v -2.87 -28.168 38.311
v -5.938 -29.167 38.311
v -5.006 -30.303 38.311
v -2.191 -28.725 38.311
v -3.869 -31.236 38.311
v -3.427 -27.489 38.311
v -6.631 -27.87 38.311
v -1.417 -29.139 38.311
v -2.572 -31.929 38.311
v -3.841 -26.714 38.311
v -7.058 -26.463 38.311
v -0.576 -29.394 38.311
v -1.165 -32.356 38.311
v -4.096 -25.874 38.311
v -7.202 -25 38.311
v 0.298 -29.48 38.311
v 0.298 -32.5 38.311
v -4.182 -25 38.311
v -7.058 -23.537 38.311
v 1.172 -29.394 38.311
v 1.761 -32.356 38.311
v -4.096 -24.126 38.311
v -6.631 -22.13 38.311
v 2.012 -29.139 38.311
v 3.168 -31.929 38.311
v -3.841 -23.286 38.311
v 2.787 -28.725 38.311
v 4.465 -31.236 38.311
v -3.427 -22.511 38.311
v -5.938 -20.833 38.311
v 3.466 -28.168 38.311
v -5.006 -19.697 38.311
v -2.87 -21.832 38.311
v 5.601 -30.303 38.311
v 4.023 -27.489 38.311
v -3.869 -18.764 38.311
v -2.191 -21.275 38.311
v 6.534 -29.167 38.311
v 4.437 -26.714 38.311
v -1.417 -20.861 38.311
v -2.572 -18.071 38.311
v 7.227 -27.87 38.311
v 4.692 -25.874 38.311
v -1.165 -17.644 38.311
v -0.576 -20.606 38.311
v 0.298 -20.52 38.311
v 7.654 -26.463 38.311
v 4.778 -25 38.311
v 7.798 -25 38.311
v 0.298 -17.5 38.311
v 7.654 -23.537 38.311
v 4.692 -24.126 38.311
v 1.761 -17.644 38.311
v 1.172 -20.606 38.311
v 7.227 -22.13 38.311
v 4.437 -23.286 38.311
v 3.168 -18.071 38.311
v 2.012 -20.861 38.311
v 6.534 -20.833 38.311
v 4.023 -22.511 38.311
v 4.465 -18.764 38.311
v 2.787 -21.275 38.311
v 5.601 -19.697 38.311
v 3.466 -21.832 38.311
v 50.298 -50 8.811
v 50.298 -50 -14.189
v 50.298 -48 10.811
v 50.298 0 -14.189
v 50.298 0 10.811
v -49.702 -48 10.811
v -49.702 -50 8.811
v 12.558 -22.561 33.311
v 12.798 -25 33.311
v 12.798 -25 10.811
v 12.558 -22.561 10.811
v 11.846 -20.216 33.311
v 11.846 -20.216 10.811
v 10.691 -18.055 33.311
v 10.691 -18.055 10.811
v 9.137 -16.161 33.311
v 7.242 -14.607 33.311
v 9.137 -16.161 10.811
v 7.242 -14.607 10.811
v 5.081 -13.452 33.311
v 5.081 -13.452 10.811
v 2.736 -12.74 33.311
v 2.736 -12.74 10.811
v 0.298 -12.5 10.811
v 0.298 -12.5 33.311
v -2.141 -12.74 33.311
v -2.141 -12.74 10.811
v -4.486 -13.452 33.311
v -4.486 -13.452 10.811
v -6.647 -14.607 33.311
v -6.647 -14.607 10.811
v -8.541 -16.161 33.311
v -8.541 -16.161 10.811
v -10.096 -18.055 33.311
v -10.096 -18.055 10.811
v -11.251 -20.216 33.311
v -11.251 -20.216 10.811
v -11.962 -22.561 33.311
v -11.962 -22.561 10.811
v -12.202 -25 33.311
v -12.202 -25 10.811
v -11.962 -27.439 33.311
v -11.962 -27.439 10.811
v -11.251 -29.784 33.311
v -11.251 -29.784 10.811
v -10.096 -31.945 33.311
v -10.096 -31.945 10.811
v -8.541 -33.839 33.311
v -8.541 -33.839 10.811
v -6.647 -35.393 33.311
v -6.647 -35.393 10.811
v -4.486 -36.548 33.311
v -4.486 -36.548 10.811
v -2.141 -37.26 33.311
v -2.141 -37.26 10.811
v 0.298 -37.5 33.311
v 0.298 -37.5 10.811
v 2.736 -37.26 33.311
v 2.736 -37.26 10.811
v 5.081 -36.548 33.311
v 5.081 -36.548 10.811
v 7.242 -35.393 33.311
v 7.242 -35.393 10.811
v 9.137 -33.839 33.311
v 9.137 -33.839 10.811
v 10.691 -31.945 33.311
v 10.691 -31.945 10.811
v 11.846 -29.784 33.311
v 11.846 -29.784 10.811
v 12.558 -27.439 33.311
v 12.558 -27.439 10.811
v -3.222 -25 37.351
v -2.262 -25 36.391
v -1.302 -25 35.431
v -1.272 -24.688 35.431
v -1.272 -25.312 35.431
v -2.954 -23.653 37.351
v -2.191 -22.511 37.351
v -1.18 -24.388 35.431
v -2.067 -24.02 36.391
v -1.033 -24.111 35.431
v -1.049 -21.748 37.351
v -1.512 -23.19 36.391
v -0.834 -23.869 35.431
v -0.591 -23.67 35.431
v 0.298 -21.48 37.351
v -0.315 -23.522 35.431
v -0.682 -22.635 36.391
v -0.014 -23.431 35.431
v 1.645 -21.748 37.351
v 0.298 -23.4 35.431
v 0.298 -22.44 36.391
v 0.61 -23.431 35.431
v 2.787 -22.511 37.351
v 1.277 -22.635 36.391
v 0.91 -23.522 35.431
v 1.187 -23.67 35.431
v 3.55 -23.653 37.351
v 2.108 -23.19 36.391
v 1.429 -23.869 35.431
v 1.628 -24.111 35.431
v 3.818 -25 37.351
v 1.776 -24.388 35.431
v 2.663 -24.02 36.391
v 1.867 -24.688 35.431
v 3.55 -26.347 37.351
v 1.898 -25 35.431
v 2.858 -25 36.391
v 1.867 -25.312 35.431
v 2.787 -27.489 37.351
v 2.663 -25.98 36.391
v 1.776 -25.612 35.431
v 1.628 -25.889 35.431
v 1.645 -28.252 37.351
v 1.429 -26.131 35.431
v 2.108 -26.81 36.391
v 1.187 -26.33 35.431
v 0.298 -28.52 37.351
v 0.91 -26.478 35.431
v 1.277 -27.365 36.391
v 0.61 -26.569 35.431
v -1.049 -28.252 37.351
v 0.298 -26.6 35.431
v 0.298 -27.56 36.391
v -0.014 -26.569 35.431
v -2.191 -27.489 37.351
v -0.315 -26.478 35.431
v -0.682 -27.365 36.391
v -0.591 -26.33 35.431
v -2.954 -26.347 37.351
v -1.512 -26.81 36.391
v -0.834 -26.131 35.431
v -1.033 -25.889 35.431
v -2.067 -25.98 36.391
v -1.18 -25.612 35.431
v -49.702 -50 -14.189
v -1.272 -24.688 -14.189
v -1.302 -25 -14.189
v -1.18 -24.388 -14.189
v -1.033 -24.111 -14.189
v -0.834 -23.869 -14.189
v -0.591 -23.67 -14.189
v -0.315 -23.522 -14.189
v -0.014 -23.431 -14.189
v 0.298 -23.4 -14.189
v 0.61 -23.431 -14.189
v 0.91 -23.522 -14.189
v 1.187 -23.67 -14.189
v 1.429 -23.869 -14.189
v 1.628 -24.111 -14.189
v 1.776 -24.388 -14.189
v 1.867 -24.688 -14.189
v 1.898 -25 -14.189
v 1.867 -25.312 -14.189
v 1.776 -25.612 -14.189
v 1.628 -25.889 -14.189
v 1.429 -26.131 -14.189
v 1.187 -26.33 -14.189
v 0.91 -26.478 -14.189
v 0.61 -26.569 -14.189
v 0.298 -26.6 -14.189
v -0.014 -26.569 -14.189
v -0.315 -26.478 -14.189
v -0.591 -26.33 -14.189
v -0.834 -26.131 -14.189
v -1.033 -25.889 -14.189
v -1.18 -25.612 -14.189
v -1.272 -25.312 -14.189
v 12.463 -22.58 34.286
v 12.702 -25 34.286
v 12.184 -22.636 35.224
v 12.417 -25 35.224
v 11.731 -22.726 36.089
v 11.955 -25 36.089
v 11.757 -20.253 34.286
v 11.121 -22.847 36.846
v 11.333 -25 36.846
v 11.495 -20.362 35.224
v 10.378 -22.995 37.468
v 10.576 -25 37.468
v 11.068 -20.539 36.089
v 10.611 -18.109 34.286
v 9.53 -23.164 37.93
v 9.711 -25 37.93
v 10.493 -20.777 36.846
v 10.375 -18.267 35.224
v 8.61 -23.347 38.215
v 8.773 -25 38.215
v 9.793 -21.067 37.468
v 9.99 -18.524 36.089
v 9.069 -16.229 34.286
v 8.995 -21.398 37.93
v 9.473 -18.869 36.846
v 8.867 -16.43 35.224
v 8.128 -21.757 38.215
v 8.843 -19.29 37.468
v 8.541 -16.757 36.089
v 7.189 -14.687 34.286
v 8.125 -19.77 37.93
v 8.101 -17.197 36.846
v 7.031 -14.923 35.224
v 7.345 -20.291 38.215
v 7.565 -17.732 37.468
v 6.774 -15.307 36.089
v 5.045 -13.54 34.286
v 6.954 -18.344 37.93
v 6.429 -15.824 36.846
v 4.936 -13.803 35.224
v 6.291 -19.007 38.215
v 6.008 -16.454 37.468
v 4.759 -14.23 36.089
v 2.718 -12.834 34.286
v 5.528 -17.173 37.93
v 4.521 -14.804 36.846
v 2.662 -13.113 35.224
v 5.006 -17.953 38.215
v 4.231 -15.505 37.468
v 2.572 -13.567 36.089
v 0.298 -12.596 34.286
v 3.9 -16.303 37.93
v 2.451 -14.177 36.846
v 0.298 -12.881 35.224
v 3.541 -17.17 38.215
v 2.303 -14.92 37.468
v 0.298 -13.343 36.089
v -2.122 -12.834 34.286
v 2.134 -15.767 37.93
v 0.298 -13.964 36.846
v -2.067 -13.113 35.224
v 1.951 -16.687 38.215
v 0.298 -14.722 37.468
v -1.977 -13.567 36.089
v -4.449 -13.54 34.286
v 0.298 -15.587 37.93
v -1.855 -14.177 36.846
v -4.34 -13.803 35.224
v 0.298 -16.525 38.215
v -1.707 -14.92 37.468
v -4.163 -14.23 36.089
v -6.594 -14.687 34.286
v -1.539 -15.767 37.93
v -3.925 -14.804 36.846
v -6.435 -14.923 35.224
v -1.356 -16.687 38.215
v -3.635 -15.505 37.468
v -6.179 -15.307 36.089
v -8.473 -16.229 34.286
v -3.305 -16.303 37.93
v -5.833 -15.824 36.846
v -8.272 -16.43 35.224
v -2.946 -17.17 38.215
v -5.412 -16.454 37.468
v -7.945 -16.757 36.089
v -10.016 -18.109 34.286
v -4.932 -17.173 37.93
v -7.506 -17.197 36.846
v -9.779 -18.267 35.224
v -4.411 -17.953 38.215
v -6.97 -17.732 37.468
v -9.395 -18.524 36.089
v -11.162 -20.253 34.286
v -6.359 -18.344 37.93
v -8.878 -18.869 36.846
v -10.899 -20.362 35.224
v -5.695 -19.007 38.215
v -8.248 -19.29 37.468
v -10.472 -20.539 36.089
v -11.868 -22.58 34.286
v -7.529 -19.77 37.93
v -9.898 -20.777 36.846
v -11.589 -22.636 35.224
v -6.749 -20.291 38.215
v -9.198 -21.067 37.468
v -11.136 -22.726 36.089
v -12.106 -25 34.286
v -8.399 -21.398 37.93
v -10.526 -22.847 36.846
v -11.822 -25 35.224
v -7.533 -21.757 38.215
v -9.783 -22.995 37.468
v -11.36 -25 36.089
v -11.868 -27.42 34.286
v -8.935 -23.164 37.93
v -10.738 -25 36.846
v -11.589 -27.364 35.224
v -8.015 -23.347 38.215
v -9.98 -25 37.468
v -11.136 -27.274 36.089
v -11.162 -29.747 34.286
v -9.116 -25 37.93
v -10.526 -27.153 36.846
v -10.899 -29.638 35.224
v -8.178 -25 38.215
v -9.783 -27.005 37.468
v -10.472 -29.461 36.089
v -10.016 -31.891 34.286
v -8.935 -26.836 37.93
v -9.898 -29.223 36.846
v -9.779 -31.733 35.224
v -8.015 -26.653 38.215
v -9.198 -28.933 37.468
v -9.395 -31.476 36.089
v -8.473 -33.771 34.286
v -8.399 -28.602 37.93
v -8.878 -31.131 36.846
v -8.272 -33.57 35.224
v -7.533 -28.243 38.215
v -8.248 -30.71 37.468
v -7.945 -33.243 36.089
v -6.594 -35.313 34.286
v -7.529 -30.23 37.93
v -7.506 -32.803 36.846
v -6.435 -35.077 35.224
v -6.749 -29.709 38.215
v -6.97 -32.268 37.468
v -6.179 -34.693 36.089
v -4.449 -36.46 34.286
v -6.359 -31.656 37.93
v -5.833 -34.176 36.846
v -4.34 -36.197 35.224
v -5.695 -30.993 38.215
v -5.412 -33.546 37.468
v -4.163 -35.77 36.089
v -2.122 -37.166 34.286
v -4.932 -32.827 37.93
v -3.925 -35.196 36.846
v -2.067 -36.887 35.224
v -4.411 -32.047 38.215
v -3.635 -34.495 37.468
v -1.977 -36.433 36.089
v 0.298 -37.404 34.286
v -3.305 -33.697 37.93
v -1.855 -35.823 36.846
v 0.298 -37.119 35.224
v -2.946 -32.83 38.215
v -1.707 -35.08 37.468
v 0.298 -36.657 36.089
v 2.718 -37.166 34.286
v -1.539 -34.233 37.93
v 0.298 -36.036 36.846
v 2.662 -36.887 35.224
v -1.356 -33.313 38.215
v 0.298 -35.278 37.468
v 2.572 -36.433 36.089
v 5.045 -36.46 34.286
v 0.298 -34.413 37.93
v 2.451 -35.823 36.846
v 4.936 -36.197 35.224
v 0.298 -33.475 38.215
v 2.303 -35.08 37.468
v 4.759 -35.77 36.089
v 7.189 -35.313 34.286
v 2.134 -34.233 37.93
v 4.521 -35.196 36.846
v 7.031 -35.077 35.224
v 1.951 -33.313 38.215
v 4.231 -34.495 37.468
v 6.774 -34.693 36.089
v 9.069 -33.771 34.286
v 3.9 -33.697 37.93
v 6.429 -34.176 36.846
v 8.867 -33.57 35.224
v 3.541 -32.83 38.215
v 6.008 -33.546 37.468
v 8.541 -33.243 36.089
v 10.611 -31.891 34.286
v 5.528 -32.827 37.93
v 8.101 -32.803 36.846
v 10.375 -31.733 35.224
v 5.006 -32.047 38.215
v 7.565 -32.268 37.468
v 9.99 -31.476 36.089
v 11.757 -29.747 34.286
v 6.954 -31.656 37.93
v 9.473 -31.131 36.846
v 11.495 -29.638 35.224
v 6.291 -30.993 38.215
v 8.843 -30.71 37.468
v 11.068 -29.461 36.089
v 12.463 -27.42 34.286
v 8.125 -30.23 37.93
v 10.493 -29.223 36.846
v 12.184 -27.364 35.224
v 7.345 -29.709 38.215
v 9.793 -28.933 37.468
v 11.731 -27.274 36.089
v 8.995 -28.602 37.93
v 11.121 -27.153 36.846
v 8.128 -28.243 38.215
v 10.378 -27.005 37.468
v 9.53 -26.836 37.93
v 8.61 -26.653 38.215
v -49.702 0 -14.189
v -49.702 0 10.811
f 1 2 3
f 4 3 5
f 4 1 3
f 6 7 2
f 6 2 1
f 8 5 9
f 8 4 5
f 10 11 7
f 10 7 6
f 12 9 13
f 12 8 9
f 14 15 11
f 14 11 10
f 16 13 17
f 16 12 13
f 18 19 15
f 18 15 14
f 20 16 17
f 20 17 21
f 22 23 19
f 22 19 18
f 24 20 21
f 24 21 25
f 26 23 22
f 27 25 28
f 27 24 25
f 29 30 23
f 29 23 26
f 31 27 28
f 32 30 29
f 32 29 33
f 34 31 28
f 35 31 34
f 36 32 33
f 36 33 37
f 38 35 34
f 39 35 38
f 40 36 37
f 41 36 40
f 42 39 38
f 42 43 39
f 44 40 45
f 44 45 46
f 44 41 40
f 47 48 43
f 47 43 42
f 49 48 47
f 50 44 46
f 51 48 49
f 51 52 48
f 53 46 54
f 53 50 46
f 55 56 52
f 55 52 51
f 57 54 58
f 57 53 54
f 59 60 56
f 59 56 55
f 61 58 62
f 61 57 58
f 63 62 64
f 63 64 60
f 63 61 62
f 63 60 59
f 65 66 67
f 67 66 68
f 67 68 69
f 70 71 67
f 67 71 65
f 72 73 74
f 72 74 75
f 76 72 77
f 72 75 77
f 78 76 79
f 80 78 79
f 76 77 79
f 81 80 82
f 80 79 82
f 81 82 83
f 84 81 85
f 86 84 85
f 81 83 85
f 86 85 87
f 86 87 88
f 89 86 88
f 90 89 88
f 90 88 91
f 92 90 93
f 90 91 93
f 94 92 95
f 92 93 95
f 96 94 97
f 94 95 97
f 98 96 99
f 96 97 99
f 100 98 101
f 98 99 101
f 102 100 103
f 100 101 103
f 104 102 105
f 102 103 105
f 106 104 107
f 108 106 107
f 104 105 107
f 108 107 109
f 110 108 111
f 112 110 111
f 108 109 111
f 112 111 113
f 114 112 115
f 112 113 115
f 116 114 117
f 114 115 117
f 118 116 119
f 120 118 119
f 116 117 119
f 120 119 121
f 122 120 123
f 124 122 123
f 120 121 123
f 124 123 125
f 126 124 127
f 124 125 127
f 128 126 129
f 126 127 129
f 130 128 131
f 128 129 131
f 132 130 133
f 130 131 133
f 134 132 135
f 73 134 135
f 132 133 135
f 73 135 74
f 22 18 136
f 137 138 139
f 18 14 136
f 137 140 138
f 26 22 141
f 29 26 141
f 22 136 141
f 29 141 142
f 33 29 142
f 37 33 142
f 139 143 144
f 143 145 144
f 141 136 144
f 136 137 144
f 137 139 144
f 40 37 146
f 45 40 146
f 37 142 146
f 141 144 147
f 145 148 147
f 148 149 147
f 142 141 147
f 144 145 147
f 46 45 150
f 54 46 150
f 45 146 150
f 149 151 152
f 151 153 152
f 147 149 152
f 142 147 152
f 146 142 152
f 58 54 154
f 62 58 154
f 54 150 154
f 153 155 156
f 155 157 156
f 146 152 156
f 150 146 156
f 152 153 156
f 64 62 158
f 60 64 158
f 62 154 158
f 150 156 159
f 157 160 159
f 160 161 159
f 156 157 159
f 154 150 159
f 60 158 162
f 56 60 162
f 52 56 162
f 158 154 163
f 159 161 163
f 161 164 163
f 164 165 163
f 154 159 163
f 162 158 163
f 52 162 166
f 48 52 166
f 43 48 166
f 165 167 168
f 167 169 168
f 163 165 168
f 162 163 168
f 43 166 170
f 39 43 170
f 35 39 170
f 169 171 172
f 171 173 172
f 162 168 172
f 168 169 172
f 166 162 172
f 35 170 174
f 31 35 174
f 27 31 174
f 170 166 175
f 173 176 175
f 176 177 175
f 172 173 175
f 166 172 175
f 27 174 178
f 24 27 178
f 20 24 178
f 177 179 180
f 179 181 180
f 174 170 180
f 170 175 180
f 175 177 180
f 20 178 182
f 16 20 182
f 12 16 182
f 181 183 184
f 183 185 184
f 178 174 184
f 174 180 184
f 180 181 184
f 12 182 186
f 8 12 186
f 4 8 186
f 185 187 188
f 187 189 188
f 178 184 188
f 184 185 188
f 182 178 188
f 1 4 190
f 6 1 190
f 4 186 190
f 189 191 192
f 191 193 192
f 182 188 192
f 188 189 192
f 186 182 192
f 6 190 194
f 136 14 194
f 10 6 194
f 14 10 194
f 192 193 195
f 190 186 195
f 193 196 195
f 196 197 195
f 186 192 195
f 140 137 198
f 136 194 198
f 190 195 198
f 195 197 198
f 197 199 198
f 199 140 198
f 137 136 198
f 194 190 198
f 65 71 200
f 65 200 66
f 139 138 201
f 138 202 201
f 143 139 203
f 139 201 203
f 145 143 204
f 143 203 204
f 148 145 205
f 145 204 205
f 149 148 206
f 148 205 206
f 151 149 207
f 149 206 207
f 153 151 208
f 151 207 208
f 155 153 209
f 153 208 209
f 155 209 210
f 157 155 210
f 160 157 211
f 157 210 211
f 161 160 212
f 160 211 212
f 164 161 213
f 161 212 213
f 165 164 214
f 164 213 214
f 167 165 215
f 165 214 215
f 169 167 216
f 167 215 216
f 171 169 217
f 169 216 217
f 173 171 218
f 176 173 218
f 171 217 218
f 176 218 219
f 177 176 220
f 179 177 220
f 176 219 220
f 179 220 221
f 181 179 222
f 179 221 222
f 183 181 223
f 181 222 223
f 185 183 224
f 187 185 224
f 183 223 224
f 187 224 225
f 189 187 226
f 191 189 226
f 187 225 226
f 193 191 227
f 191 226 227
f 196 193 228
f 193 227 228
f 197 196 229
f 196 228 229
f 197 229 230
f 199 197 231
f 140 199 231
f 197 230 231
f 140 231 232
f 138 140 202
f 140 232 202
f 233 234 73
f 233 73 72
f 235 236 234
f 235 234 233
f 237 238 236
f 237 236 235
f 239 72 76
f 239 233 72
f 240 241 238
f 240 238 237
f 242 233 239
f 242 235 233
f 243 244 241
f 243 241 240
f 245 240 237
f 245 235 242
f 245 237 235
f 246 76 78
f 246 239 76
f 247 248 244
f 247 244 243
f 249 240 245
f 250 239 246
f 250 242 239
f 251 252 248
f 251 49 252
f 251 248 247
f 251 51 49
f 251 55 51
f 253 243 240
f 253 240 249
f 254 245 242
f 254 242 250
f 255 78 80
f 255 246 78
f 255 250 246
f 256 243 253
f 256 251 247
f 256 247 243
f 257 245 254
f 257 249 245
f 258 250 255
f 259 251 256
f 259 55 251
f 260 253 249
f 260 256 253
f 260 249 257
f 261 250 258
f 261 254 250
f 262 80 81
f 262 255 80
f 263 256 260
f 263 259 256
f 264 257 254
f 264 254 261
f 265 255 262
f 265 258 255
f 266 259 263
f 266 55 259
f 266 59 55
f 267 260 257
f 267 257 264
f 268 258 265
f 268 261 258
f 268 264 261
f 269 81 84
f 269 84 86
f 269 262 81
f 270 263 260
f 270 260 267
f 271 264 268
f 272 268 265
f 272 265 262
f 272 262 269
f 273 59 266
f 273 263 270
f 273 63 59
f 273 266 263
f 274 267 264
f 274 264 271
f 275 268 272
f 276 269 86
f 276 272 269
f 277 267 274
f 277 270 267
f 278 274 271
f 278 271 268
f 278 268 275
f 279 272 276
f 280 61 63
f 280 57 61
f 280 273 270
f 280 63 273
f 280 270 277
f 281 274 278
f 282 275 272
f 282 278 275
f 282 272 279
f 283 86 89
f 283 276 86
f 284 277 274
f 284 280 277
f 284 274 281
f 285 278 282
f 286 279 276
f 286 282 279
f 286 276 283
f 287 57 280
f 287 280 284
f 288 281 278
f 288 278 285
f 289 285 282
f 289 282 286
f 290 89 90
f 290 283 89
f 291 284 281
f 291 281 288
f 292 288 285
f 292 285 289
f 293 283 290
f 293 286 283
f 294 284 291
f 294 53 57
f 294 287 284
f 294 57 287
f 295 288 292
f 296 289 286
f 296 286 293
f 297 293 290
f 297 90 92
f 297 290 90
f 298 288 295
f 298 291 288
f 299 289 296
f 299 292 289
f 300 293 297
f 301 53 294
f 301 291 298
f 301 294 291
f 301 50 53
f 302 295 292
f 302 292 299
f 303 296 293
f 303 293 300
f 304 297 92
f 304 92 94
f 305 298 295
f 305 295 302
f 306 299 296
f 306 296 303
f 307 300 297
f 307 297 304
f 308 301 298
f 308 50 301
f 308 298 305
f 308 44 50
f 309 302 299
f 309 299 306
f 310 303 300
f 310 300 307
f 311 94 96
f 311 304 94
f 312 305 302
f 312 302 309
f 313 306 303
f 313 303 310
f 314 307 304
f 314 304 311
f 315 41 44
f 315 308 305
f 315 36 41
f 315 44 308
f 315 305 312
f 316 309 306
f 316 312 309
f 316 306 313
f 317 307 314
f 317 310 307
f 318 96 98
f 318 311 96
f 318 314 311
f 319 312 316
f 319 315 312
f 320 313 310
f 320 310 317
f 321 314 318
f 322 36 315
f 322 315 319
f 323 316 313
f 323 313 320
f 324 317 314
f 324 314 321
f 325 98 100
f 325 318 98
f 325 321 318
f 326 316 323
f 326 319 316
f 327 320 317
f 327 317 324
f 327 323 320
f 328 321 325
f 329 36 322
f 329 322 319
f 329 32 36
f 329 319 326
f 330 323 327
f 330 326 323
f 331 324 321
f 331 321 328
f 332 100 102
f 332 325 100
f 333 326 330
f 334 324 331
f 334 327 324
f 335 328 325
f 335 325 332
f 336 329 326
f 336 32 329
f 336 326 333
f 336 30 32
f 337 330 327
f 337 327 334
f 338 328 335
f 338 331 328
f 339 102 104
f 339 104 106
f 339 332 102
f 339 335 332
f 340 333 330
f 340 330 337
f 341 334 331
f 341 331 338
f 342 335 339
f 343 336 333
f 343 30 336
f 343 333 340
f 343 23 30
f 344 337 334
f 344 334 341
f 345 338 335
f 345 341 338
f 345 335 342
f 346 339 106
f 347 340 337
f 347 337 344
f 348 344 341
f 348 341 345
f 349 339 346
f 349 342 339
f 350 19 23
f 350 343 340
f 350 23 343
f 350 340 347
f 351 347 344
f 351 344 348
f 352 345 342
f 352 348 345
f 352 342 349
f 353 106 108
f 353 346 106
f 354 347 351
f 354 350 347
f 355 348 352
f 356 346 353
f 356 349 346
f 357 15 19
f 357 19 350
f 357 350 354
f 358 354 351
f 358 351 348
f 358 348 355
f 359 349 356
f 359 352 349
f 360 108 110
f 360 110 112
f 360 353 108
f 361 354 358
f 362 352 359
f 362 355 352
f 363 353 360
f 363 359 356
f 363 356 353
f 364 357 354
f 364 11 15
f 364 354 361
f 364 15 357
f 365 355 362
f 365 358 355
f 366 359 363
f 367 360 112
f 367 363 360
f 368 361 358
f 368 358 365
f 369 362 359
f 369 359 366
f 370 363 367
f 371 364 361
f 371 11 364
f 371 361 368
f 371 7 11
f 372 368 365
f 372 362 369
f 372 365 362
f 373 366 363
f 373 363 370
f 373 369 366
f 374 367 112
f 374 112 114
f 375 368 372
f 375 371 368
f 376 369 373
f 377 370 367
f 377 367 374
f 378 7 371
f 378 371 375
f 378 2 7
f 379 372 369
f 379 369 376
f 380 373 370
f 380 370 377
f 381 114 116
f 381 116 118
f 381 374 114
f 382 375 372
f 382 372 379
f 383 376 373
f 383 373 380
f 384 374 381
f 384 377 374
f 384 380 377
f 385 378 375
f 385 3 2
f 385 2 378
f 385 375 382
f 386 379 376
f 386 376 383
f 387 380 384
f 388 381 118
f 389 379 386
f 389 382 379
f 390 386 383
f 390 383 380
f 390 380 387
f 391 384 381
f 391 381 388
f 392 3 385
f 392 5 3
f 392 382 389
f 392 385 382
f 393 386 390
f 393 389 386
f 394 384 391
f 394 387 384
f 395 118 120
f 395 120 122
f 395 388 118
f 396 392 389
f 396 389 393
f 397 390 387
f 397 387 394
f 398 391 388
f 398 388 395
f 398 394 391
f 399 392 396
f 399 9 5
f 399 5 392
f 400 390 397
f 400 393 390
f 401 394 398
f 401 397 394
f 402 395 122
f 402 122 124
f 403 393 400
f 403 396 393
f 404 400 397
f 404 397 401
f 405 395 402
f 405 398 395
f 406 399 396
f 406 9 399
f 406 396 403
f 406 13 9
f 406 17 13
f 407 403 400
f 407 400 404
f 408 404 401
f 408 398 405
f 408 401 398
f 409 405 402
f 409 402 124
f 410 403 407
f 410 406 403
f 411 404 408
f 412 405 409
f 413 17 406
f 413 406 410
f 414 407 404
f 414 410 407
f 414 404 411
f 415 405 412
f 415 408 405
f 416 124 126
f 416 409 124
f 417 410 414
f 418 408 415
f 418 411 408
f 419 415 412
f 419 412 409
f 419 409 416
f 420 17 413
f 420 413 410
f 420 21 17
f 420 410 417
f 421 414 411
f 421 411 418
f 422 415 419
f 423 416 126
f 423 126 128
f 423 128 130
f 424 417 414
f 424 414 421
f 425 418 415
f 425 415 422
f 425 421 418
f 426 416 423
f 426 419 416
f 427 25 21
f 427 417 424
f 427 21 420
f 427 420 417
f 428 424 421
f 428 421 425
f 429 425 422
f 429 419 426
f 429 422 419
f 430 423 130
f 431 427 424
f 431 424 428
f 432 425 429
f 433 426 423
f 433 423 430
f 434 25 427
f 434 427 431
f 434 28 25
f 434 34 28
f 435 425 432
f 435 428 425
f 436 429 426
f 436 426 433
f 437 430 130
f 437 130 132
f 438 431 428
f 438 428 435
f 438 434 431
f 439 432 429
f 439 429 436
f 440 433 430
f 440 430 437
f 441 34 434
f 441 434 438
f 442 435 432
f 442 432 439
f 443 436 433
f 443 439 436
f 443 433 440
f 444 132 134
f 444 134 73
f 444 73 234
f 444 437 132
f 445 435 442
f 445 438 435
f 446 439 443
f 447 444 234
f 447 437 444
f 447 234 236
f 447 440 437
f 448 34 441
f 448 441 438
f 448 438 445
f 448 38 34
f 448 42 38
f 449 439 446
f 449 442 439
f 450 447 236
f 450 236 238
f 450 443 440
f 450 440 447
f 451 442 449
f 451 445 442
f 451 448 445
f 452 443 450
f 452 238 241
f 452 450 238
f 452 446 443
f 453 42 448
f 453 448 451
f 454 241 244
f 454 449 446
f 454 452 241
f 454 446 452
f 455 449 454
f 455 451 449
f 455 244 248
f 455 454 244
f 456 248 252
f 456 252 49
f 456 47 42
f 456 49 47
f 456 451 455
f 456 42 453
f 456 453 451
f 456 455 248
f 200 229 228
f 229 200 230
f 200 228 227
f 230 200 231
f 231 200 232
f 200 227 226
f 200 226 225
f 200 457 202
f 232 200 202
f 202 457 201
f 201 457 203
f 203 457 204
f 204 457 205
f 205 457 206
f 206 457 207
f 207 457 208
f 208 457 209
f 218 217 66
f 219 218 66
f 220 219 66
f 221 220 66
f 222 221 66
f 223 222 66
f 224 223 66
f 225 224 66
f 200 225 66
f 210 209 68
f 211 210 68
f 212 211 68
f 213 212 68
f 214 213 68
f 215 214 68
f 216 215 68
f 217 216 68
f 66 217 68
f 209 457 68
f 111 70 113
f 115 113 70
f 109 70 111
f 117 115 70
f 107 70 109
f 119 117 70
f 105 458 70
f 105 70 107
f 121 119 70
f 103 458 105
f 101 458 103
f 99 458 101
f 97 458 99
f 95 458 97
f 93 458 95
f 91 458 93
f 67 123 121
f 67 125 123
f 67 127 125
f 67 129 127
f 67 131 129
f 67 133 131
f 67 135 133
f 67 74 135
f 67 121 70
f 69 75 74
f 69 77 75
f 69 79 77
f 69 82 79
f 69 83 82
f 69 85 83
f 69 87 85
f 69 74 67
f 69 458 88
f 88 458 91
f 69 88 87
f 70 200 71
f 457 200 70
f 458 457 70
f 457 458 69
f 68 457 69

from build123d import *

# Parameters (mm, degrees)
F0_W           = 100
F0_H           = 25
F1_DEPTH       = 50
F2_SIZE        = 2
F3_R           = 12.5
F4_DEPTH       = 27.5
F5_R           = 5
F7_D           = 3.2
F7_CSINK_D     = 8.96
F7_CSINK_ANGLE = 90


with BuildPart() as f1:
    # F0 (on Front) → F1 (new body)
    with BuildSketch(Plane.XZ):
        with Locations((0.2977304684, -1.6892874761)):
            Rectangle(F0_W, F0_H)
    extrude(amount=F1_DEPTH)

    # F2
    f2_edges = [f1.edges().sort_by_distance(p)[0] for p in [
        (0.29773, -50, 10.810713),
    ]]
    chamfer(f2_edges, length=F2_SIZE)

    # F3 (on face) → F4 (join)
    with BuildSketch(Plane.XY.offset(10.8107125239)):
        with Locations((0.2977304684, -25)):
            Circle(F3_R)
    extrude(amount=F4_DEPTH)

    # F5
    f5_edges = [f1.edges().sort_by_distance(p)[0] for p in [
        (-12.20227, -25, 38.310713),
    ]]
    fillet(f5_edges, radius=F5_R)

    # F7 (through all)
    with Locations(Plane.XY.offset(38.3107125239)):
        with Locations((0.2977304684, -25)):
            CounterSinkHole(F7_D / 2, F7_CSINK_D / 2, counter_sink_angle=F7_CSINK_ANGLE)


solid = f1.part
